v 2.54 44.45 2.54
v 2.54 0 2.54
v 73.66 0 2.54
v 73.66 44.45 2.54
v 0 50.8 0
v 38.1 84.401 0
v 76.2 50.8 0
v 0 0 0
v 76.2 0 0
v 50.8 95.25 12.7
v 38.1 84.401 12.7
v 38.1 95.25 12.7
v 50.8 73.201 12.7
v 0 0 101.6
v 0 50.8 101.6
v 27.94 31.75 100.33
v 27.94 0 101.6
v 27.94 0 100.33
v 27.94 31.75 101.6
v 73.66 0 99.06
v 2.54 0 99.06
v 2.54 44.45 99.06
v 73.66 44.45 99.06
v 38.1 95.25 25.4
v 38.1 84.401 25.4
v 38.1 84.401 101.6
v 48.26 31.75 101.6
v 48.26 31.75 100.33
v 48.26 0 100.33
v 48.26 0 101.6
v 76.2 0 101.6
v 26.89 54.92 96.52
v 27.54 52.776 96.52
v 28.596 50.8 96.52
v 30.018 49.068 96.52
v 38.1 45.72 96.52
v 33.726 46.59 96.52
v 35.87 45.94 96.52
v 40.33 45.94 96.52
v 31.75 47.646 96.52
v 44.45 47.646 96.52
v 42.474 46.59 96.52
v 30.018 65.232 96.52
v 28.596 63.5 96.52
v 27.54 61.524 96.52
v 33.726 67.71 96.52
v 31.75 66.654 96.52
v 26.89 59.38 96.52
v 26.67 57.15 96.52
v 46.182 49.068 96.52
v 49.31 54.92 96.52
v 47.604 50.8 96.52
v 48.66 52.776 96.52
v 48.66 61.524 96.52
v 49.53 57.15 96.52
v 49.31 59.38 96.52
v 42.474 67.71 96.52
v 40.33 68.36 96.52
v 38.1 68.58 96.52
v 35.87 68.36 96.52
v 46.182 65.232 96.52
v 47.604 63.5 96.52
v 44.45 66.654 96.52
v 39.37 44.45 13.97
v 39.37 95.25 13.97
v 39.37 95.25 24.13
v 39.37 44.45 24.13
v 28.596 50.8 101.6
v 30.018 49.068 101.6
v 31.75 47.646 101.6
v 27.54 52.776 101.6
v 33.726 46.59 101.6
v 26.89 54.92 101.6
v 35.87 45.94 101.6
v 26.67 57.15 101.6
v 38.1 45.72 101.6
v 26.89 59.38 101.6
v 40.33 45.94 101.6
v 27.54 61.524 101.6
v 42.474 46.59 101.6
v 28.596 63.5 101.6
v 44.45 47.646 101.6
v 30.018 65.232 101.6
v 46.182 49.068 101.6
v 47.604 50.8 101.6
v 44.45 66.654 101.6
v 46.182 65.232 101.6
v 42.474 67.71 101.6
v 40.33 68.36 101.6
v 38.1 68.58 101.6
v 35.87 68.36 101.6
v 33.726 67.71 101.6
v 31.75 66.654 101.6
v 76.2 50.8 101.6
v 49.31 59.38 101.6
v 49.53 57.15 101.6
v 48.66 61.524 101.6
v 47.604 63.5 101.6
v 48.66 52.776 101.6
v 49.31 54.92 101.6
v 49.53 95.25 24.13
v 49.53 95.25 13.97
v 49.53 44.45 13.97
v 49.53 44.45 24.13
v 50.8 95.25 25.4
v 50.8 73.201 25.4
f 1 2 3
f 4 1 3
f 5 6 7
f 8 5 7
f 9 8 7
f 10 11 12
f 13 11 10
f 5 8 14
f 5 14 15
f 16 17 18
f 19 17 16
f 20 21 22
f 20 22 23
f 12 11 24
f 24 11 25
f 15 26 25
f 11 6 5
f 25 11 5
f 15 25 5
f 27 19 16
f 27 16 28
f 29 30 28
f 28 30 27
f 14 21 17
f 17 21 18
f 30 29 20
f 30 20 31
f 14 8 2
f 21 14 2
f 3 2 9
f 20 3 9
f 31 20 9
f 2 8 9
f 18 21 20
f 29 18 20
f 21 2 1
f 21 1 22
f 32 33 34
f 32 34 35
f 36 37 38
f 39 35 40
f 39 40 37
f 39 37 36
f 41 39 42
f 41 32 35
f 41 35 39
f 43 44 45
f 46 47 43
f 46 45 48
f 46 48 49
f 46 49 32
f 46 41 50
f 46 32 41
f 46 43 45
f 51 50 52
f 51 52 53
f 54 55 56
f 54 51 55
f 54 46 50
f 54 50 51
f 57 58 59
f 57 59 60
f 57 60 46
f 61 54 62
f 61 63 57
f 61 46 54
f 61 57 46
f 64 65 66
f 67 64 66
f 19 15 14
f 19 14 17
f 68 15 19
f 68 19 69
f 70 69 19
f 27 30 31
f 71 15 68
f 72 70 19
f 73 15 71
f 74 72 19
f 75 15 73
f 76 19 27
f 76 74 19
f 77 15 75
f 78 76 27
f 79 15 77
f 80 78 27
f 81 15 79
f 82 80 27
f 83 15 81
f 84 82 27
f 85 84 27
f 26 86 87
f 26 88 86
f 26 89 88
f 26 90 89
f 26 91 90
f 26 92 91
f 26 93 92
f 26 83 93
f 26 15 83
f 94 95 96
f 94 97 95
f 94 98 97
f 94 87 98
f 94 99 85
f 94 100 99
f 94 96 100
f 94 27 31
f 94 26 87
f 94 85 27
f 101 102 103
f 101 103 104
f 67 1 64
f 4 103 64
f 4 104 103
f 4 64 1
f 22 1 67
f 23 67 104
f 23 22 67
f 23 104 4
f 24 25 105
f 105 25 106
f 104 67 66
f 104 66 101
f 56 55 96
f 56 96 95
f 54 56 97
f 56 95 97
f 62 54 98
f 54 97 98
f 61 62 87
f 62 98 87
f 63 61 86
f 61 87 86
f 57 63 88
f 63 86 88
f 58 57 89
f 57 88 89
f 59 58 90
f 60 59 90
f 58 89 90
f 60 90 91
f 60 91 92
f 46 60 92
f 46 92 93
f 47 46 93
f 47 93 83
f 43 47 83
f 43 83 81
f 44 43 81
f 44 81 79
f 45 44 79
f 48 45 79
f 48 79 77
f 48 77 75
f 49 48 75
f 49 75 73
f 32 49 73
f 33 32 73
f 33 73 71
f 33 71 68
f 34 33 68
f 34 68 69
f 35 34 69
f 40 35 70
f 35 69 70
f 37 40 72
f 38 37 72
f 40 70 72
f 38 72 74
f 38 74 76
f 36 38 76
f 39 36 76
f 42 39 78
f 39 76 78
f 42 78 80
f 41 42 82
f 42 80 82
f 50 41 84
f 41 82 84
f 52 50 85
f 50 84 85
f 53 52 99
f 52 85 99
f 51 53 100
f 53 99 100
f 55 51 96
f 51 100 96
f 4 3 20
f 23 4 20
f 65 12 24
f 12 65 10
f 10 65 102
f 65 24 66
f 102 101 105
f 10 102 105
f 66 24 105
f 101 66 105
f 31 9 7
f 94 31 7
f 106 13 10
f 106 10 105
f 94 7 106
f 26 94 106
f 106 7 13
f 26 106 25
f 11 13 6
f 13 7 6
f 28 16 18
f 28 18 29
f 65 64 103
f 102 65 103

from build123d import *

# Parameters (mm, degrees)
F0_W     = 76.2
F0_H     = 50.8
F1_DEPTH = 101.6
F3_W     = 71.12
F3_H     = 96.52
F4_DEPTH = 44.45
F2_R     = 11.43
F5_DEPTH = 5.08
F2_W     = 20.32
F2_H     = 31.75
F6_DEPTH = 1.27
F7_W     = 12.7
F7_H     = 12.7
F7_W_2   = 10.16
F7_H_2   = 10.16
F8_DEPTH = 50.8
F9_DEPTH = 50.801


with BuildPart() as f1:
    # F0 (on Top) → F1 (new body)
    with BuildSketch(Plane.XY):
        Polygon((38.1, 84.401042), (0, 50.8), (76.2, 50.8), align=None)
        with Locations((38.1, 25.4)):
            Rectangle(F0_W, F0_H)
    extrude(amount=F1_DEPTH)

    # F3 (on face) → F4 (cut)
    with BuildSketch(Plane.XZ):
        with Locations((38.1, 50.8)):
            Rectangle(F3_W, F3_H)
    extrude(amount=-F4_DEPTH, mode=Mode.SUBTRACT)

    # F2 (on face) → F5 (cut)
    with BuildSketch(Plane.XY.offset(101.6)):
        with Locations((38.1, 57.15)):
            Circle(F2_R)
    extrude(amount=-F5_DEPTH, mode=Mode.SUBTRACT)

    # F2 (on face) → F6 (cut)
    with BuildSketch(Plane.XY.offset(101.6)):
        with Locations((38.1, 15.875)):
            Rectangle(F2_W, F2_H)
        with Locations((38.1, 57.15)):
            Circle(F2_R)
    extrude(amount=-F6_DEPTH, mode=Mode.SUBTRACT)

    # F7 (on face) → F8 (join)
    with BuildSketch(Plane.XZ.offset(-44.45)):
        with Locations((44.45, 19.05)):
            Rectangle(F7_W, F7_H)
        with Locations((44.45, 19.05)):
            Rectangle(F7_W_2, F7_H_2, mode=Mode.SUBTRACT)
    extrude(amount=-F8_DEPTH)

    # F7 (on face) → F9 (cut, through all)
    with BuildSketch(Plane.XZ.offset(-44.45)):
        with Locations((44.45, 19.05)):
            Rectangle(F7_W_2, F7_H_2)
    extrude(amount=-F9_DEPTH, mode=Mode.SUBTRACT)


solid = f1.part
